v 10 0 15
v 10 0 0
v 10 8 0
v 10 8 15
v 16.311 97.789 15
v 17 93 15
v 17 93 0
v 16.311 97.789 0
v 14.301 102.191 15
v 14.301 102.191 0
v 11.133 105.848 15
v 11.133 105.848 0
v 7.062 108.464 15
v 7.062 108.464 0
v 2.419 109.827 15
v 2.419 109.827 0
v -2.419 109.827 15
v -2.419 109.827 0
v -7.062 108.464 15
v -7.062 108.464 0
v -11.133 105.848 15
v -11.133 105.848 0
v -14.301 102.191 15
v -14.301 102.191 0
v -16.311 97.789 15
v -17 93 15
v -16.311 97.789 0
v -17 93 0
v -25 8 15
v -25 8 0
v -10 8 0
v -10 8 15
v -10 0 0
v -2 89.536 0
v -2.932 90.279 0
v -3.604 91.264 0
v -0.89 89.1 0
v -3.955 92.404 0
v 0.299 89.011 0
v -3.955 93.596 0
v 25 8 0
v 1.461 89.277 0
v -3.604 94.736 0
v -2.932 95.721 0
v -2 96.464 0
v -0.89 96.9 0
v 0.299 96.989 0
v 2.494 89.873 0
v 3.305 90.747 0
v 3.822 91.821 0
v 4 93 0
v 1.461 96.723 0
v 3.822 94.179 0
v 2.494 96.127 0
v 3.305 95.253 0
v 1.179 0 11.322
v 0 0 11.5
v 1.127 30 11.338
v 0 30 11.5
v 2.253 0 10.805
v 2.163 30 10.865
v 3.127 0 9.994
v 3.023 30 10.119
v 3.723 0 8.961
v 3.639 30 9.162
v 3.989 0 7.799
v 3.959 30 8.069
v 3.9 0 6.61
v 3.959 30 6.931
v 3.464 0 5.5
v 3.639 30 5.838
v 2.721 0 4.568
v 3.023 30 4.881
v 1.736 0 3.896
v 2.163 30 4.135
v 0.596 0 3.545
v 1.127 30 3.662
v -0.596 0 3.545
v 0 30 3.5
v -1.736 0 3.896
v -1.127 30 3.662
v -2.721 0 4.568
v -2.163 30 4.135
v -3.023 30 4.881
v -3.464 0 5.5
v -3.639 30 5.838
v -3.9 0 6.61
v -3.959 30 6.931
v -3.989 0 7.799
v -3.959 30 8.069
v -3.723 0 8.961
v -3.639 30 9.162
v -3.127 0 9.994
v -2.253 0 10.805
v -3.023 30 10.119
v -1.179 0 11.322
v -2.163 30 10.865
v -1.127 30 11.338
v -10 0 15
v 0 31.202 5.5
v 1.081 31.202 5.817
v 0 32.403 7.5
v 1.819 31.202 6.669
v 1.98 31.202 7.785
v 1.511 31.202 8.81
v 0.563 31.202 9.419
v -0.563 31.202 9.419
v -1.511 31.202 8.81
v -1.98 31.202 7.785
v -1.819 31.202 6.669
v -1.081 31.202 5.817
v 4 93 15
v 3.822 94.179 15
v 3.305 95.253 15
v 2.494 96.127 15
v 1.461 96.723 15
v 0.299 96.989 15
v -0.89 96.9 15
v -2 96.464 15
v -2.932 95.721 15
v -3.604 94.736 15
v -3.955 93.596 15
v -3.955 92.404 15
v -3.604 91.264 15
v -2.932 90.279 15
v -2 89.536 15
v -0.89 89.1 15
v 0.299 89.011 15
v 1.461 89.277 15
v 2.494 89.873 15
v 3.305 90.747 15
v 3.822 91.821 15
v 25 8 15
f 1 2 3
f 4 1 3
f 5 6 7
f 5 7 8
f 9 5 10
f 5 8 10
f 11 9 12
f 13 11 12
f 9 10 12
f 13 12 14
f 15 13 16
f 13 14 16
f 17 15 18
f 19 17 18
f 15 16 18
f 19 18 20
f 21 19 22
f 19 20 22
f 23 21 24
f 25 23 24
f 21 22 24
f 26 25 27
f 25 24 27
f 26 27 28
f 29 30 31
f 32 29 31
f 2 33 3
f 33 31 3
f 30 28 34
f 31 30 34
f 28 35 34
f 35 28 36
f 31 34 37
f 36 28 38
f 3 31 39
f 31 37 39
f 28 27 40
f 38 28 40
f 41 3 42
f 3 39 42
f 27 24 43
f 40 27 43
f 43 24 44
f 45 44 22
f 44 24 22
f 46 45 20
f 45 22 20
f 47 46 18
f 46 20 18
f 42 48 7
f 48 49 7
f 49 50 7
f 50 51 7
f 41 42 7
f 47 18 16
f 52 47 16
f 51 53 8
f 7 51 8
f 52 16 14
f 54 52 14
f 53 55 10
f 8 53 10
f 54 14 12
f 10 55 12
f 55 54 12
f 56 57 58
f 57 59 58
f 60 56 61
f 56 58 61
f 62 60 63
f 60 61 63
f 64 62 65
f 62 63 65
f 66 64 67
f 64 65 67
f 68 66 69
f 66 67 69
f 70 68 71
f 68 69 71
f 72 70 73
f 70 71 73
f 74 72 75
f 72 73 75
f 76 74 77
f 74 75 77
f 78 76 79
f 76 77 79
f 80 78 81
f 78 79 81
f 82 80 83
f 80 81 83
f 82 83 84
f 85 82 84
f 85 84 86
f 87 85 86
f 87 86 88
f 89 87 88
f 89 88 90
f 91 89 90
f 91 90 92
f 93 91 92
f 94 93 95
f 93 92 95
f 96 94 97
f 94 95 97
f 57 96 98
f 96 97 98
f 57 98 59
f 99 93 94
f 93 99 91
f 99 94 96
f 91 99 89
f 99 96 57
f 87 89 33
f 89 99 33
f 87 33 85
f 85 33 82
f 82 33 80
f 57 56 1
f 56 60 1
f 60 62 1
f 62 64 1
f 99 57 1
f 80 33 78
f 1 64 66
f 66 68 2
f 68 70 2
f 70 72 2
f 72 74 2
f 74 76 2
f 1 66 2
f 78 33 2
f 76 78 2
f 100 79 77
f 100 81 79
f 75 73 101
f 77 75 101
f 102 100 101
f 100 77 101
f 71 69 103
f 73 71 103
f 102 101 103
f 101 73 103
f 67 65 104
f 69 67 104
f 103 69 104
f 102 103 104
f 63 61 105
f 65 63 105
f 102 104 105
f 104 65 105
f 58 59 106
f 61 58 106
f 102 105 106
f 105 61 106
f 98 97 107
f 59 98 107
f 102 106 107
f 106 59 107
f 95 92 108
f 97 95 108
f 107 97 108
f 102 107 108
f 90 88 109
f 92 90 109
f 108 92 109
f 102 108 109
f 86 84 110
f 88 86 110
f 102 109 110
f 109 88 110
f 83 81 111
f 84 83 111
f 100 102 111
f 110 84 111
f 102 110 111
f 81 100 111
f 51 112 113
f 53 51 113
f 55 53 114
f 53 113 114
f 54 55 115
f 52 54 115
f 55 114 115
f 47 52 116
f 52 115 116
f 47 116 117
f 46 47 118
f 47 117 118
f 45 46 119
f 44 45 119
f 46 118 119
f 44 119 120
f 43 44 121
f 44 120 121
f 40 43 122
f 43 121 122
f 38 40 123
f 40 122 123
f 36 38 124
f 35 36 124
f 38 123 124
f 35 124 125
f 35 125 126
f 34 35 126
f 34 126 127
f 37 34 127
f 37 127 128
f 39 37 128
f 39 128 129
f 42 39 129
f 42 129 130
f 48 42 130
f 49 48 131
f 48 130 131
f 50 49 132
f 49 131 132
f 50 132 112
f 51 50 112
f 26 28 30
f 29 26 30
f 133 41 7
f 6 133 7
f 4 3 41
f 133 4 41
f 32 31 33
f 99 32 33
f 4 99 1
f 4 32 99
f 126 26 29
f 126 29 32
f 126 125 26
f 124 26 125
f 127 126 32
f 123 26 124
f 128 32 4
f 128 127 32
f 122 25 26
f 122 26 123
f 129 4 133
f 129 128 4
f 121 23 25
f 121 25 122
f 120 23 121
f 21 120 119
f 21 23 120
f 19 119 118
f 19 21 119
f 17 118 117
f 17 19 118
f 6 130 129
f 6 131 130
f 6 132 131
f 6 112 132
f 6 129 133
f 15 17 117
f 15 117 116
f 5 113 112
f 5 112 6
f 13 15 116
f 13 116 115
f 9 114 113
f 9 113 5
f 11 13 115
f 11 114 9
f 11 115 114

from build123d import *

# Parameters (mm, degrees)
SKETCH1_R                 = 7
BOSS_EXTRUDE1_DEPTH       = 15
F_8_0MM_DOWEL_HOLE1_D     = 8
F_8_0MM_DOWEL_HOLE1_DEPTH = 30
F_8_0MM_DOWEL_HOLE1_TIP   = 2.403442476
SKETCH3_R                 = 7
SKETCH3_R_2               = 4
BOSS_EXTRUDE2_DEPTH       = 15


with BuildPart() as part:
    # Sketch1 → Boss-Extrude1 (new body)
    with BuildSketch(Plane.XY):
        with BuildLine():
            Line((-10, 0), (10, 0))
            Line((10, 0), (10, 8))
            Line((10, 8), (25, 8))
            Line((25, 8), (17, 93))
            ThreePointArc((17, 93), (0, 110), (-17, 93))
            Line((-17, 93), (-25, 8))
            Line((-25, 8), (-10, 8))
            Line((-10, 8), (-10, 0))
        make_face()
        with Locations((0, 93)):
            Circle(SKETCH1_R, mode=Mode.SUBTRACT)
    extrude(amount=BOSS_EXTRUDE1_DEPTH)

    # Ø8.0mm Dowel Hole1
    with Locations(Plane(origin=(0, 0, 7.5), x_dir=(0, 0, -1), z_dir=(0, -1, 0))):
        with Locations((0, 0)):
            Hole(F_8_0MM_DOWEL_HOLE1_D / 2, depth=F_8_0MM_DOWEL_HOLE1_DEPTH)
            with Locations((0, 0, -(F_8_0MM_DOWEL_HOLE1_DEPTH + F_8_0MM_DOWEL_HOLE1_TIP / 2))):  # 118° drill point
                Cone(0, F_8_0MM_DOWEL_HOLE1_D / 2, F_8_0MM_DOWEL_HOLE1_TIP, mode=Mode.SUBTRACT)

    # Sketch3 → Boss-Extrude2 (add, through all)
    with BuildSketch(Plane.XY.offset(15)):
        with Locations((0, 93)):
            Circle(SKETCH3_R)
        with Locations((0, 93)):
            Circle(SKETCH3_R_2, mode=Mode.SUBTRACT)
    extrude(amount=-BOSS_EXTRUDE2_DEPTH)


solid = part.part
